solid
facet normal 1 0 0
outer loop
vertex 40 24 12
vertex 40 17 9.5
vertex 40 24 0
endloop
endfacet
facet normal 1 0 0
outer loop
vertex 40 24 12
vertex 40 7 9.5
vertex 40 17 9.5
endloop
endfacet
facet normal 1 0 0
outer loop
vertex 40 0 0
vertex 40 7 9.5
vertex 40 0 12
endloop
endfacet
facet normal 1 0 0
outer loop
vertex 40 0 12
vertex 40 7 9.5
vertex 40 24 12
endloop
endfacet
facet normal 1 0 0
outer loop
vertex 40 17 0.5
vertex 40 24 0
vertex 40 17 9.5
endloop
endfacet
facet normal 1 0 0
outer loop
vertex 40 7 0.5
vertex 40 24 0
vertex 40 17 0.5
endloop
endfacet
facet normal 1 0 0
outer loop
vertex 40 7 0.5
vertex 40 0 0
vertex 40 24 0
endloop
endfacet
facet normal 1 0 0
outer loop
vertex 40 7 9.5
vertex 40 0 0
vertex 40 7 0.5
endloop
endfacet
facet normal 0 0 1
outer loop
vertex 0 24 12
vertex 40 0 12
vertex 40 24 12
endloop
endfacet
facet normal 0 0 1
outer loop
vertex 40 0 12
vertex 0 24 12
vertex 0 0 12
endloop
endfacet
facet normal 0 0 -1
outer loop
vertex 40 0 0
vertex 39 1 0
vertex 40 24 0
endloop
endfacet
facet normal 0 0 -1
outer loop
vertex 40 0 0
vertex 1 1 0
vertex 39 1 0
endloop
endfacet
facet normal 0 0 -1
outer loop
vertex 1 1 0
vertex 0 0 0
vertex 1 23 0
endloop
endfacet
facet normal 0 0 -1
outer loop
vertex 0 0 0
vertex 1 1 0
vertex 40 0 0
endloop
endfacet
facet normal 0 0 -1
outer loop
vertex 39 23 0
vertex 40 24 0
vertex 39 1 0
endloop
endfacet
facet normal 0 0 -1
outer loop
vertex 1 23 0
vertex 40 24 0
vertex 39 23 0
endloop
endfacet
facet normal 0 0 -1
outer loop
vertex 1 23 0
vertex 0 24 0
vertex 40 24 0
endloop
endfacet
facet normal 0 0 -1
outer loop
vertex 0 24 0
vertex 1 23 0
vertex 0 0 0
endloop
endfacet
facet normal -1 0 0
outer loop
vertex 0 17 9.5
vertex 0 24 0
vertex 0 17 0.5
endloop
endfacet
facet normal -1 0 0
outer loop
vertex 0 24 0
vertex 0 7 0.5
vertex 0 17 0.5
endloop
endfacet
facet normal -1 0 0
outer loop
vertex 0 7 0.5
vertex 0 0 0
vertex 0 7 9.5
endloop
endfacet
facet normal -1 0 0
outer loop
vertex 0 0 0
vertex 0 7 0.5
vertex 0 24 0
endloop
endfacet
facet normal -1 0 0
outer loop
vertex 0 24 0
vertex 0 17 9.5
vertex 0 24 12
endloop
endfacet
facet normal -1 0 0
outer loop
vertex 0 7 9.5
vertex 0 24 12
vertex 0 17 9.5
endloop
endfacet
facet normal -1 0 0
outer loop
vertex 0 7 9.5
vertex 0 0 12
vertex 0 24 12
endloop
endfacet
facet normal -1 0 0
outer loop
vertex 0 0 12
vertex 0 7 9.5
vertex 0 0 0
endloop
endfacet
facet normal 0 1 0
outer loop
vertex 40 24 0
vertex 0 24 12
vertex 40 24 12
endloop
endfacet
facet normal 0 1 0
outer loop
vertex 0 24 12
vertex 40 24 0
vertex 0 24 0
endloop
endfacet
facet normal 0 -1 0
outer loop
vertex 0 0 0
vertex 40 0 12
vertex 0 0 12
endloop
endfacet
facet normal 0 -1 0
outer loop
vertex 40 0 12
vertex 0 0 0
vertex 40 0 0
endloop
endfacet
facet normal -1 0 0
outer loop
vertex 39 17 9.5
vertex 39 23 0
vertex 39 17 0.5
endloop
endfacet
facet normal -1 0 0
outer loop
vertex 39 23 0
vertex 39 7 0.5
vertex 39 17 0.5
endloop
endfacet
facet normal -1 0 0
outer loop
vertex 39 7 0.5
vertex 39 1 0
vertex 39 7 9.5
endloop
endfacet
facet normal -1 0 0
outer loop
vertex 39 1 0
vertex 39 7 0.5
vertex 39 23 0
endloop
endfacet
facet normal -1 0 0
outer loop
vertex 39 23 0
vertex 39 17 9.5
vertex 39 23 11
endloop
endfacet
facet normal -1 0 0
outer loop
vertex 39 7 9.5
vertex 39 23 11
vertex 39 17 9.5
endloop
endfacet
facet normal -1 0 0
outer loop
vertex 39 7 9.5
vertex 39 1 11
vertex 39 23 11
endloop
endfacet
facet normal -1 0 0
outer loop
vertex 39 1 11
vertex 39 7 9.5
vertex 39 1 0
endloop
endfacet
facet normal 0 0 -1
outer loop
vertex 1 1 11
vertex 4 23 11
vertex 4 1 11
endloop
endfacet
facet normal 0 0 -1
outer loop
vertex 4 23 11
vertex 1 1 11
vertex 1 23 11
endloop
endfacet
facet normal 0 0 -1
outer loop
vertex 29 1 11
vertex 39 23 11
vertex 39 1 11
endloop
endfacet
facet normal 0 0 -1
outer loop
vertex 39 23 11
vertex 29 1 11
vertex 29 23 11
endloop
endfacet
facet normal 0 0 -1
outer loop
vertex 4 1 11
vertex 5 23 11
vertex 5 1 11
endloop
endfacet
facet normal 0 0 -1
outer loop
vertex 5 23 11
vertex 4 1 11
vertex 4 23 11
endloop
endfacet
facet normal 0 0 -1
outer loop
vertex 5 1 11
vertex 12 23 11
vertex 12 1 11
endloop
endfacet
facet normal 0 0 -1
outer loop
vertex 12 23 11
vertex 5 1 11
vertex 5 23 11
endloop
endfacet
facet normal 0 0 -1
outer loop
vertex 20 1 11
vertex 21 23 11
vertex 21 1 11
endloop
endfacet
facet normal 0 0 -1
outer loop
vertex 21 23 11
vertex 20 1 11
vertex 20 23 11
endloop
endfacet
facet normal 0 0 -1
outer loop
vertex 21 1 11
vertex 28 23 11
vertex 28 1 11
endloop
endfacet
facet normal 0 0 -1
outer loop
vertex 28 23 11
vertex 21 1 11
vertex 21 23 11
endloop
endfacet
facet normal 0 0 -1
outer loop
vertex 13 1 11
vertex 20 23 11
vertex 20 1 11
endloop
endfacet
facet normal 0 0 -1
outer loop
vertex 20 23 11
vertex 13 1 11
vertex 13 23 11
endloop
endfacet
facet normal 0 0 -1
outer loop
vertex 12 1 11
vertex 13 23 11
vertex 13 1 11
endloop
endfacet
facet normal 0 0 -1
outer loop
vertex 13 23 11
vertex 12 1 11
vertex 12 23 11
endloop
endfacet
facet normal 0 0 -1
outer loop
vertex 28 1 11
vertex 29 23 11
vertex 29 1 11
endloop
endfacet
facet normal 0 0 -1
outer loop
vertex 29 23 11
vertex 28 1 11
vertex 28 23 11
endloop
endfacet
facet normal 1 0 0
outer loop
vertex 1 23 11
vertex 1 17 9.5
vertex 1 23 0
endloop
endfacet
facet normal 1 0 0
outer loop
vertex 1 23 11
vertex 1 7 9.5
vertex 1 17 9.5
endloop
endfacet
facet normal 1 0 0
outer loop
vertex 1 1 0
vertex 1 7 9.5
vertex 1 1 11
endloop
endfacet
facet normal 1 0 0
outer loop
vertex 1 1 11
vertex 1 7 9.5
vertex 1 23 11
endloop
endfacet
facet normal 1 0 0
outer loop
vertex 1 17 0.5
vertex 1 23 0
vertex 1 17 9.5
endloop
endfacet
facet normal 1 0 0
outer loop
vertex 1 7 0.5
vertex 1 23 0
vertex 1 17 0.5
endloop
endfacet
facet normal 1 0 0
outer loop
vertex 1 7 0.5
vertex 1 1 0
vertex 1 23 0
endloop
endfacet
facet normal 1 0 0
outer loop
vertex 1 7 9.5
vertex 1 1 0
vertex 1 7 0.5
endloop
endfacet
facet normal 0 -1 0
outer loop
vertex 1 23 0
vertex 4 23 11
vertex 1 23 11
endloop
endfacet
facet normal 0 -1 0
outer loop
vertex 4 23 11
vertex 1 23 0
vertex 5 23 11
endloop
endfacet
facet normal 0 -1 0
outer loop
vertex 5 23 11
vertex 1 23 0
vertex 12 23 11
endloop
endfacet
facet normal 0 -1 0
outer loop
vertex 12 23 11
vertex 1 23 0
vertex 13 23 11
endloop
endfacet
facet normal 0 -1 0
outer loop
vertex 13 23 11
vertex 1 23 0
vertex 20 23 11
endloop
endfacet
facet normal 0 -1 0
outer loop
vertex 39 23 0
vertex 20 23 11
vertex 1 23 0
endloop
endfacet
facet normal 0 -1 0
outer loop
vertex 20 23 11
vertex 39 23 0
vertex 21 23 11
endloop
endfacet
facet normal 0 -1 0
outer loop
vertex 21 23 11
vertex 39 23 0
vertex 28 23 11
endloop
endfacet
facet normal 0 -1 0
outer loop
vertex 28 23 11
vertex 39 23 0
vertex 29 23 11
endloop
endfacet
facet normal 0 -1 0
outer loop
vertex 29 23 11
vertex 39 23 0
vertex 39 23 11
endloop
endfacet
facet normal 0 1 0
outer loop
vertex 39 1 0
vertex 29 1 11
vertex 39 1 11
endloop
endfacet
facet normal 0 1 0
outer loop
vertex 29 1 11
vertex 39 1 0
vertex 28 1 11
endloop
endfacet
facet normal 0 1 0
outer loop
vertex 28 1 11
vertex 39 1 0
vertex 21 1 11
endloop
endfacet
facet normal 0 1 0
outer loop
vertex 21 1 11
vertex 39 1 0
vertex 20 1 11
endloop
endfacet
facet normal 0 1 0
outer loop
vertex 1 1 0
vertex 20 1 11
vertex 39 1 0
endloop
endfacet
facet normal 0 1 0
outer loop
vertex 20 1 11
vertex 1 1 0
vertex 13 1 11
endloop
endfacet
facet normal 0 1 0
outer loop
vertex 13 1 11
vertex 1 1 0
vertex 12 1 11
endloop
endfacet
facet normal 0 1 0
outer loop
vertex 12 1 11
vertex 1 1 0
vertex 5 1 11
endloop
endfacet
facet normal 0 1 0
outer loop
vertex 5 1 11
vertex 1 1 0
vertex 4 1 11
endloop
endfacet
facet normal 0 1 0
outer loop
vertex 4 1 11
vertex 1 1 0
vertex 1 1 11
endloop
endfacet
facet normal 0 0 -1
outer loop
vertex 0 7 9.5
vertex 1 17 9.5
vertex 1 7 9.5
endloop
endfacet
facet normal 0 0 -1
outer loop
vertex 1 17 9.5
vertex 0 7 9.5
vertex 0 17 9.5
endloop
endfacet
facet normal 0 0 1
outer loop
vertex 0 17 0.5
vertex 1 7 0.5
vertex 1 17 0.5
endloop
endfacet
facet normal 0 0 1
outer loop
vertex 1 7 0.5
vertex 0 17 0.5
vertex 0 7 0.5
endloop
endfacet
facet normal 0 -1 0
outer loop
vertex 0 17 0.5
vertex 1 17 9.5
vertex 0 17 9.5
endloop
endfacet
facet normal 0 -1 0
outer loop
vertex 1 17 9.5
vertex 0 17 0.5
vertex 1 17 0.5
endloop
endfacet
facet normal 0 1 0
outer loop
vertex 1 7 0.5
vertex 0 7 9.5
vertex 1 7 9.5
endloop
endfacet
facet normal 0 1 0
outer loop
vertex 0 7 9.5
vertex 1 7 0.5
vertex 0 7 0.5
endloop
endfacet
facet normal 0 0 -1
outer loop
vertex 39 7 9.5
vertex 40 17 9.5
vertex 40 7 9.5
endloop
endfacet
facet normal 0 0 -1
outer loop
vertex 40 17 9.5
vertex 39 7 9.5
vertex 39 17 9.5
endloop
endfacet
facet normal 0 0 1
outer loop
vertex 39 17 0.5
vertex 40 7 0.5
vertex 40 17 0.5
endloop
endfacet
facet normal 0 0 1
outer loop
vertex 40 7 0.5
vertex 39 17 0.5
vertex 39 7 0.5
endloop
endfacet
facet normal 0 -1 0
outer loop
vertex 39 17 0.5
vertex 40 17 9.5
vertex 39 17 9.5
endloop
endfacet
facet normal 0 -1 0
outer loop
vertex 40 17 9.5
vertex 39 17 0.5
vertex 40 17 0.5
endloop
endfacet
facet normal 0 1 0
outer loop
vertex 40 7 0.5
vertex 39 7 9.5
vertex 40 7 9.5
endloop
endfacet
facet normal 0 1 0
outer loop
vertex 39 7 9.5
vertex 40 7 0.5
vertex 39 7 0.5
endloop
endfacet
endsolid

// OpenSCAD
// 可进入机库/大棚 - 大跨度内部空间, 两端大开口 (可开车进入)
// 外 40(x) × 24(y) × 12(z); 薄墙; 内部完全中空
// +X = 长轴(开口在两端), +Y = 宽, +Z = 高

module hangar() {
  difference() {
    cube([40, 24, 12]);
    // 内腔 (顶部留 1 厚)
    translate([1, 1, 0]) cube([38, 22, 11]);
    // 两端大门 (x=0 与 x=40 面) 大开口 w10 h9
    translate([-0.1, 7, 0.5]) cube([1.2, 10, 9]);
    translate([38.9, 7, 0.5]) cube([1.2, 10, 9]);
  }
}

module truss() {
  // 屋顶桁架
  for (x = [4 : 8 : 32]) {
    translate([x, 1, 11]) cube([1, 22, 1]);
  }
}

color("#9a9a90") hangar();
color("#6b6b63") truss();
